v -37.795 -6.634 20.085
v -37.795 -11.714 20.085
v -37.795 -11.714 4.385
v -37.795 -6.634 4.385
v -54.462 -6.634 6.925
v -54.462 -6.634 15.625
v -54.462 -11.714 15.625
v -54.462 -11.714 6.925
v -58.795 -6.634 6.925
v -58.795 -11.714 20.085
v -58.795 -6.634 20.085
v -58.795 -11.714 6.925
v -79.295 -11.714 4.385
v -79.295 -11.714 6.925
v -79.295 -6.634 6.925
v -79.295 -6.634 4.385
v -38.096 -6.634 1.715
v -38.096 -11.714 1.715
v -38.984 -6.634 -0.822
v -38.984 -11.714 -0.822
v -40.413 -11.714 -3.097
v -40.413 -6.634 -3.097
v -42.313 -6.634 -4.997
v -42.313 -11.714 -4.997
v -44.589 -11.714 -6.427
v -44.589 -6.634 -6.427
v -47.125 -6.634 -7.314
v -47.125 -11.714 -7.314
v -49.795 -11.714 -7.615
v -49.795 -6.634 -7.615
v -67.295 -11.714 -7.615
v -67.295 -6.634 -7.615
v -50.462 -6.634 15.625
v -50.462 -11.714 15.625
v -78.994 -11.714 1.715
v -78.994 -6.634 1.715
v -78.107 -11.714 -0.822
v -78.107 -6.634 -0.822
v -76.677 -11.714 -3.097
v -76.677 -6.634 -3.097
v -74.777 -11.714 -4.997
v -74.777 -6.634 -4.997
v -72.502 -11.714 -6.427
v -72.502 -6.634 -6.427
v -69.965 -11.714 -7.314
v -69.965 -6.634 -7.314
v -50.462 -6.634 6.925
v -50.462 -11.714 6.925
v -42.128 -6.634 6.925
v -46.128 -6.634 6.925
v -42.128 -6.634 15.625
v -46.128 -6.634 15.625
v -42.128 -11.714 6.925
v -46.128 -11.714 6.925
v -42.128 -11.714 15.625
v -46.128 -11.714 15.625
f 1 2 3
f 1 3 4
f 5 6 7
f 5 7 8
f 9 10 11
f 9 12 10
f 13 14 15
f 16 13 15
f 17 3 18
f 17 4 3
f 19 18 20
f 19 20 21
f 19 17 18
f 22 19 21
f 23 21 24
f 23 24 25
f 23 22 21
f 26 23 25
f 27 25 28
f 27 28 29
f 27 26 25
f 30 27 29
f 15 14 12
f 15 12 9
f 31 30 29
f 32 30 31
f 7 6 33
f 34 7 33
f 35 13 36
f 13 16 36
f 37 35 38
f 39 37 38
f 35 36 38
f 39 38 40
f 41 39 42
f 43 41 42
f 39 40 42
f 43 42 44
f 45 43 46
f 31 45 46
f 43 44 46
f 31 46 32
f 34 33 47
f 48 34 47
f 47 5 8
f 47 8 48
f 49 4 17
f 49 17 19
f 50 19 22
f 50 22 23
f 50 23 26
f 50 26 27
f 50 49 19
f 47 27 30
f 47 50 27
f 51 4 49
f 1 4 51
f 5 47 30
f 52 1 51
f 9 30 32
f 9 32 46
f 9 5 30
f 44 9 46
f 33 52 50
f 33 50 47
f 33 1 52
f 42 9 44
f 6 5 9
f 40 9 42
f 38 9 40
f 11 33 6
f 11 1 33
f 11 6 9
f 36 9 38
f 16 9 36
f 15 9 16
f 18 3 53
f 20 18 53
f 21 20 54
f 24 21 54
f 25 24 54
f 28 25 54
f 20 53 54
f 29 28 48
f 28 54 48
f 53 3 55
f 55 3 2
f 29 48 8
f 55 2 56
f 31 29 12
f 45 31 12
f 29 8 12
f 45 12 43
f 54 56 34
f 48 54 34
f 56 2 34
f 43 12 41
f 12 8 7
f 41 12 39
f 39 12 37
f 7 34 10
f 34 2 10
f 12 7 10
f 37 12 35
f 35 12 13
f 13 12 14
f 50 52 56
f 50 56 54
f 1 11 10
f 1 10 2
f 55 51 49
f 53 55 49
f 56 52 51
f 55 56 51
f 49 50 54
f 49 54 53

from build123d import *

# Parameters (mm, degrees)
SIDEBUMPERS_START       = -58.795147929
SIDEBUMPERS_OUTLINE_W   = 5.08
SIDEBUMPERS_OUTLINE_H   = 12.7
SIDEBUMPERS_DEPTH       = 21
SIDEBUMPERS_START_2     = -79.295147929
SIDEBUMPERS_2_OUTLINE_W = 5.08
SIDEBUMPERS_2_OUTLINE_H = 2.54
SIDEBUMPERS_2_DEPTH     = 62
SKETCH3_W               = 20.5
SKETCH3_H               = 5.08
CUT_EXTRUDE1_DEPTH      = 5.08
SKETCH5_W               = 21
SKETCH5_H               = 5.08
BOSS_EXTRUDE1_DEPTH     = 3
SKETCH8_W               = 41.5
SKETCH8_H               = 5.08
BOSS_EXTRUDE3_DEPTH     = 12
FILLET2_R               = 12
SKETCH9_W               = 4
SKETCH9_H               = 8.7
CUT_EXTRUDE5_DEPTH      = 5.08


# Read off the part's stored shape, not the designer's step: SideBumpers
with BuildPart() as part:
    # SideBumpers outline → SideBumpers (new body)
    with BuildSketch(Plane.YZ.offset(SIDEBUMPERS_START)):
        with Locations((-9.174171779, 10.734849265)):
            Rectangle(SIDEBUMPERS_OUTLINE_W, SIDEBUMPERS_OUTLINE_H)
    extrude(amount=SIDEBUMPERS_DEPTH)

    # SideBumpers 2 outline → SideBumpers 2 (add)
    with BuildSketch(Plane.YZ.offset(SIDEBUMPERS_START_2)):
        with Locations((-9.174171779, 5.654849265)):
            Rectangle(SIDEBUMPERS_2_OUTLINE_W, SIDEBUMPERS_2_OUTLINE_H)
    extrude(amount=SIDEBUMPERS_2_DEPTH)

    # Sketch3 → Cut-Extrude1 (cut)
    with BuildSketch(Plane(origin=(0, 0, 4.384849265), x_dir=(-1, 0, 0), z_dir=(0, 0, -1))):
        with Locations((27.545147929, -9.174171779)):
            Rectangle(SKETCH3_W, SKETCH3_H)
    extrude(amount=-CUT_EXTRUDE1_DEPTH, mode=Mode.SUBTRACT)

    # Sketch5 → Boss-Extrude1 (add)
    with BuildSketch(Plane.XY.offset(17.084849265)):
        with Locations((-48.295147929, -9.174171779)):
            Rectangle(SKETCH5_W, SKETCH5_H)
    extrude(amount=BOSS_EXTRUDE1_DEPTH)

    # Sketch8 → Boss-Extrude3 (add)
    with BuildSketch(Plane(origin=(0, 0, 4.384849265), x_dir=(-1, 0, 0), z_dir=(0, 0, -1))):
        with Locations((58.545147929, -9.174171779)):
            Rectangle(SKETCH8_W, SKETCH8_H)
    extrude(amount=BOSS_EXTRUDE3_DEPTH)

    # Fillet2
    fillet2_edges = [part.edges().sort_by_distance(p)[0] for p in [
        (-79.295147929, -9.174171779, -7.615150735),
        (-37.795147929, -9.174171779, -7.615150735),
    ]]
    fillet(fillet2_edges, radius=FILLET2_R)

    # Sketch9 → Cut-Extrude5 (cut)
    with BuildSketch(Plane(origin=(0, -6.634171779, 0), x_dir=(1, 0, 0), z_dir=(0, 1, 0))):
        with Locations((-44.128481262, -11.274849265)):
            Rectangle(SKETCH9_W, SKETCH9_H)
        with Locations((-52.461814595, -11.274849265)):
            Rectangle(SKETCH9_W, SKETCH9_H)
    extrude(amount=-CUT_EXTRUDE5_DEPTH, mode=Mode.SUBTRACT)


solid = part.part
